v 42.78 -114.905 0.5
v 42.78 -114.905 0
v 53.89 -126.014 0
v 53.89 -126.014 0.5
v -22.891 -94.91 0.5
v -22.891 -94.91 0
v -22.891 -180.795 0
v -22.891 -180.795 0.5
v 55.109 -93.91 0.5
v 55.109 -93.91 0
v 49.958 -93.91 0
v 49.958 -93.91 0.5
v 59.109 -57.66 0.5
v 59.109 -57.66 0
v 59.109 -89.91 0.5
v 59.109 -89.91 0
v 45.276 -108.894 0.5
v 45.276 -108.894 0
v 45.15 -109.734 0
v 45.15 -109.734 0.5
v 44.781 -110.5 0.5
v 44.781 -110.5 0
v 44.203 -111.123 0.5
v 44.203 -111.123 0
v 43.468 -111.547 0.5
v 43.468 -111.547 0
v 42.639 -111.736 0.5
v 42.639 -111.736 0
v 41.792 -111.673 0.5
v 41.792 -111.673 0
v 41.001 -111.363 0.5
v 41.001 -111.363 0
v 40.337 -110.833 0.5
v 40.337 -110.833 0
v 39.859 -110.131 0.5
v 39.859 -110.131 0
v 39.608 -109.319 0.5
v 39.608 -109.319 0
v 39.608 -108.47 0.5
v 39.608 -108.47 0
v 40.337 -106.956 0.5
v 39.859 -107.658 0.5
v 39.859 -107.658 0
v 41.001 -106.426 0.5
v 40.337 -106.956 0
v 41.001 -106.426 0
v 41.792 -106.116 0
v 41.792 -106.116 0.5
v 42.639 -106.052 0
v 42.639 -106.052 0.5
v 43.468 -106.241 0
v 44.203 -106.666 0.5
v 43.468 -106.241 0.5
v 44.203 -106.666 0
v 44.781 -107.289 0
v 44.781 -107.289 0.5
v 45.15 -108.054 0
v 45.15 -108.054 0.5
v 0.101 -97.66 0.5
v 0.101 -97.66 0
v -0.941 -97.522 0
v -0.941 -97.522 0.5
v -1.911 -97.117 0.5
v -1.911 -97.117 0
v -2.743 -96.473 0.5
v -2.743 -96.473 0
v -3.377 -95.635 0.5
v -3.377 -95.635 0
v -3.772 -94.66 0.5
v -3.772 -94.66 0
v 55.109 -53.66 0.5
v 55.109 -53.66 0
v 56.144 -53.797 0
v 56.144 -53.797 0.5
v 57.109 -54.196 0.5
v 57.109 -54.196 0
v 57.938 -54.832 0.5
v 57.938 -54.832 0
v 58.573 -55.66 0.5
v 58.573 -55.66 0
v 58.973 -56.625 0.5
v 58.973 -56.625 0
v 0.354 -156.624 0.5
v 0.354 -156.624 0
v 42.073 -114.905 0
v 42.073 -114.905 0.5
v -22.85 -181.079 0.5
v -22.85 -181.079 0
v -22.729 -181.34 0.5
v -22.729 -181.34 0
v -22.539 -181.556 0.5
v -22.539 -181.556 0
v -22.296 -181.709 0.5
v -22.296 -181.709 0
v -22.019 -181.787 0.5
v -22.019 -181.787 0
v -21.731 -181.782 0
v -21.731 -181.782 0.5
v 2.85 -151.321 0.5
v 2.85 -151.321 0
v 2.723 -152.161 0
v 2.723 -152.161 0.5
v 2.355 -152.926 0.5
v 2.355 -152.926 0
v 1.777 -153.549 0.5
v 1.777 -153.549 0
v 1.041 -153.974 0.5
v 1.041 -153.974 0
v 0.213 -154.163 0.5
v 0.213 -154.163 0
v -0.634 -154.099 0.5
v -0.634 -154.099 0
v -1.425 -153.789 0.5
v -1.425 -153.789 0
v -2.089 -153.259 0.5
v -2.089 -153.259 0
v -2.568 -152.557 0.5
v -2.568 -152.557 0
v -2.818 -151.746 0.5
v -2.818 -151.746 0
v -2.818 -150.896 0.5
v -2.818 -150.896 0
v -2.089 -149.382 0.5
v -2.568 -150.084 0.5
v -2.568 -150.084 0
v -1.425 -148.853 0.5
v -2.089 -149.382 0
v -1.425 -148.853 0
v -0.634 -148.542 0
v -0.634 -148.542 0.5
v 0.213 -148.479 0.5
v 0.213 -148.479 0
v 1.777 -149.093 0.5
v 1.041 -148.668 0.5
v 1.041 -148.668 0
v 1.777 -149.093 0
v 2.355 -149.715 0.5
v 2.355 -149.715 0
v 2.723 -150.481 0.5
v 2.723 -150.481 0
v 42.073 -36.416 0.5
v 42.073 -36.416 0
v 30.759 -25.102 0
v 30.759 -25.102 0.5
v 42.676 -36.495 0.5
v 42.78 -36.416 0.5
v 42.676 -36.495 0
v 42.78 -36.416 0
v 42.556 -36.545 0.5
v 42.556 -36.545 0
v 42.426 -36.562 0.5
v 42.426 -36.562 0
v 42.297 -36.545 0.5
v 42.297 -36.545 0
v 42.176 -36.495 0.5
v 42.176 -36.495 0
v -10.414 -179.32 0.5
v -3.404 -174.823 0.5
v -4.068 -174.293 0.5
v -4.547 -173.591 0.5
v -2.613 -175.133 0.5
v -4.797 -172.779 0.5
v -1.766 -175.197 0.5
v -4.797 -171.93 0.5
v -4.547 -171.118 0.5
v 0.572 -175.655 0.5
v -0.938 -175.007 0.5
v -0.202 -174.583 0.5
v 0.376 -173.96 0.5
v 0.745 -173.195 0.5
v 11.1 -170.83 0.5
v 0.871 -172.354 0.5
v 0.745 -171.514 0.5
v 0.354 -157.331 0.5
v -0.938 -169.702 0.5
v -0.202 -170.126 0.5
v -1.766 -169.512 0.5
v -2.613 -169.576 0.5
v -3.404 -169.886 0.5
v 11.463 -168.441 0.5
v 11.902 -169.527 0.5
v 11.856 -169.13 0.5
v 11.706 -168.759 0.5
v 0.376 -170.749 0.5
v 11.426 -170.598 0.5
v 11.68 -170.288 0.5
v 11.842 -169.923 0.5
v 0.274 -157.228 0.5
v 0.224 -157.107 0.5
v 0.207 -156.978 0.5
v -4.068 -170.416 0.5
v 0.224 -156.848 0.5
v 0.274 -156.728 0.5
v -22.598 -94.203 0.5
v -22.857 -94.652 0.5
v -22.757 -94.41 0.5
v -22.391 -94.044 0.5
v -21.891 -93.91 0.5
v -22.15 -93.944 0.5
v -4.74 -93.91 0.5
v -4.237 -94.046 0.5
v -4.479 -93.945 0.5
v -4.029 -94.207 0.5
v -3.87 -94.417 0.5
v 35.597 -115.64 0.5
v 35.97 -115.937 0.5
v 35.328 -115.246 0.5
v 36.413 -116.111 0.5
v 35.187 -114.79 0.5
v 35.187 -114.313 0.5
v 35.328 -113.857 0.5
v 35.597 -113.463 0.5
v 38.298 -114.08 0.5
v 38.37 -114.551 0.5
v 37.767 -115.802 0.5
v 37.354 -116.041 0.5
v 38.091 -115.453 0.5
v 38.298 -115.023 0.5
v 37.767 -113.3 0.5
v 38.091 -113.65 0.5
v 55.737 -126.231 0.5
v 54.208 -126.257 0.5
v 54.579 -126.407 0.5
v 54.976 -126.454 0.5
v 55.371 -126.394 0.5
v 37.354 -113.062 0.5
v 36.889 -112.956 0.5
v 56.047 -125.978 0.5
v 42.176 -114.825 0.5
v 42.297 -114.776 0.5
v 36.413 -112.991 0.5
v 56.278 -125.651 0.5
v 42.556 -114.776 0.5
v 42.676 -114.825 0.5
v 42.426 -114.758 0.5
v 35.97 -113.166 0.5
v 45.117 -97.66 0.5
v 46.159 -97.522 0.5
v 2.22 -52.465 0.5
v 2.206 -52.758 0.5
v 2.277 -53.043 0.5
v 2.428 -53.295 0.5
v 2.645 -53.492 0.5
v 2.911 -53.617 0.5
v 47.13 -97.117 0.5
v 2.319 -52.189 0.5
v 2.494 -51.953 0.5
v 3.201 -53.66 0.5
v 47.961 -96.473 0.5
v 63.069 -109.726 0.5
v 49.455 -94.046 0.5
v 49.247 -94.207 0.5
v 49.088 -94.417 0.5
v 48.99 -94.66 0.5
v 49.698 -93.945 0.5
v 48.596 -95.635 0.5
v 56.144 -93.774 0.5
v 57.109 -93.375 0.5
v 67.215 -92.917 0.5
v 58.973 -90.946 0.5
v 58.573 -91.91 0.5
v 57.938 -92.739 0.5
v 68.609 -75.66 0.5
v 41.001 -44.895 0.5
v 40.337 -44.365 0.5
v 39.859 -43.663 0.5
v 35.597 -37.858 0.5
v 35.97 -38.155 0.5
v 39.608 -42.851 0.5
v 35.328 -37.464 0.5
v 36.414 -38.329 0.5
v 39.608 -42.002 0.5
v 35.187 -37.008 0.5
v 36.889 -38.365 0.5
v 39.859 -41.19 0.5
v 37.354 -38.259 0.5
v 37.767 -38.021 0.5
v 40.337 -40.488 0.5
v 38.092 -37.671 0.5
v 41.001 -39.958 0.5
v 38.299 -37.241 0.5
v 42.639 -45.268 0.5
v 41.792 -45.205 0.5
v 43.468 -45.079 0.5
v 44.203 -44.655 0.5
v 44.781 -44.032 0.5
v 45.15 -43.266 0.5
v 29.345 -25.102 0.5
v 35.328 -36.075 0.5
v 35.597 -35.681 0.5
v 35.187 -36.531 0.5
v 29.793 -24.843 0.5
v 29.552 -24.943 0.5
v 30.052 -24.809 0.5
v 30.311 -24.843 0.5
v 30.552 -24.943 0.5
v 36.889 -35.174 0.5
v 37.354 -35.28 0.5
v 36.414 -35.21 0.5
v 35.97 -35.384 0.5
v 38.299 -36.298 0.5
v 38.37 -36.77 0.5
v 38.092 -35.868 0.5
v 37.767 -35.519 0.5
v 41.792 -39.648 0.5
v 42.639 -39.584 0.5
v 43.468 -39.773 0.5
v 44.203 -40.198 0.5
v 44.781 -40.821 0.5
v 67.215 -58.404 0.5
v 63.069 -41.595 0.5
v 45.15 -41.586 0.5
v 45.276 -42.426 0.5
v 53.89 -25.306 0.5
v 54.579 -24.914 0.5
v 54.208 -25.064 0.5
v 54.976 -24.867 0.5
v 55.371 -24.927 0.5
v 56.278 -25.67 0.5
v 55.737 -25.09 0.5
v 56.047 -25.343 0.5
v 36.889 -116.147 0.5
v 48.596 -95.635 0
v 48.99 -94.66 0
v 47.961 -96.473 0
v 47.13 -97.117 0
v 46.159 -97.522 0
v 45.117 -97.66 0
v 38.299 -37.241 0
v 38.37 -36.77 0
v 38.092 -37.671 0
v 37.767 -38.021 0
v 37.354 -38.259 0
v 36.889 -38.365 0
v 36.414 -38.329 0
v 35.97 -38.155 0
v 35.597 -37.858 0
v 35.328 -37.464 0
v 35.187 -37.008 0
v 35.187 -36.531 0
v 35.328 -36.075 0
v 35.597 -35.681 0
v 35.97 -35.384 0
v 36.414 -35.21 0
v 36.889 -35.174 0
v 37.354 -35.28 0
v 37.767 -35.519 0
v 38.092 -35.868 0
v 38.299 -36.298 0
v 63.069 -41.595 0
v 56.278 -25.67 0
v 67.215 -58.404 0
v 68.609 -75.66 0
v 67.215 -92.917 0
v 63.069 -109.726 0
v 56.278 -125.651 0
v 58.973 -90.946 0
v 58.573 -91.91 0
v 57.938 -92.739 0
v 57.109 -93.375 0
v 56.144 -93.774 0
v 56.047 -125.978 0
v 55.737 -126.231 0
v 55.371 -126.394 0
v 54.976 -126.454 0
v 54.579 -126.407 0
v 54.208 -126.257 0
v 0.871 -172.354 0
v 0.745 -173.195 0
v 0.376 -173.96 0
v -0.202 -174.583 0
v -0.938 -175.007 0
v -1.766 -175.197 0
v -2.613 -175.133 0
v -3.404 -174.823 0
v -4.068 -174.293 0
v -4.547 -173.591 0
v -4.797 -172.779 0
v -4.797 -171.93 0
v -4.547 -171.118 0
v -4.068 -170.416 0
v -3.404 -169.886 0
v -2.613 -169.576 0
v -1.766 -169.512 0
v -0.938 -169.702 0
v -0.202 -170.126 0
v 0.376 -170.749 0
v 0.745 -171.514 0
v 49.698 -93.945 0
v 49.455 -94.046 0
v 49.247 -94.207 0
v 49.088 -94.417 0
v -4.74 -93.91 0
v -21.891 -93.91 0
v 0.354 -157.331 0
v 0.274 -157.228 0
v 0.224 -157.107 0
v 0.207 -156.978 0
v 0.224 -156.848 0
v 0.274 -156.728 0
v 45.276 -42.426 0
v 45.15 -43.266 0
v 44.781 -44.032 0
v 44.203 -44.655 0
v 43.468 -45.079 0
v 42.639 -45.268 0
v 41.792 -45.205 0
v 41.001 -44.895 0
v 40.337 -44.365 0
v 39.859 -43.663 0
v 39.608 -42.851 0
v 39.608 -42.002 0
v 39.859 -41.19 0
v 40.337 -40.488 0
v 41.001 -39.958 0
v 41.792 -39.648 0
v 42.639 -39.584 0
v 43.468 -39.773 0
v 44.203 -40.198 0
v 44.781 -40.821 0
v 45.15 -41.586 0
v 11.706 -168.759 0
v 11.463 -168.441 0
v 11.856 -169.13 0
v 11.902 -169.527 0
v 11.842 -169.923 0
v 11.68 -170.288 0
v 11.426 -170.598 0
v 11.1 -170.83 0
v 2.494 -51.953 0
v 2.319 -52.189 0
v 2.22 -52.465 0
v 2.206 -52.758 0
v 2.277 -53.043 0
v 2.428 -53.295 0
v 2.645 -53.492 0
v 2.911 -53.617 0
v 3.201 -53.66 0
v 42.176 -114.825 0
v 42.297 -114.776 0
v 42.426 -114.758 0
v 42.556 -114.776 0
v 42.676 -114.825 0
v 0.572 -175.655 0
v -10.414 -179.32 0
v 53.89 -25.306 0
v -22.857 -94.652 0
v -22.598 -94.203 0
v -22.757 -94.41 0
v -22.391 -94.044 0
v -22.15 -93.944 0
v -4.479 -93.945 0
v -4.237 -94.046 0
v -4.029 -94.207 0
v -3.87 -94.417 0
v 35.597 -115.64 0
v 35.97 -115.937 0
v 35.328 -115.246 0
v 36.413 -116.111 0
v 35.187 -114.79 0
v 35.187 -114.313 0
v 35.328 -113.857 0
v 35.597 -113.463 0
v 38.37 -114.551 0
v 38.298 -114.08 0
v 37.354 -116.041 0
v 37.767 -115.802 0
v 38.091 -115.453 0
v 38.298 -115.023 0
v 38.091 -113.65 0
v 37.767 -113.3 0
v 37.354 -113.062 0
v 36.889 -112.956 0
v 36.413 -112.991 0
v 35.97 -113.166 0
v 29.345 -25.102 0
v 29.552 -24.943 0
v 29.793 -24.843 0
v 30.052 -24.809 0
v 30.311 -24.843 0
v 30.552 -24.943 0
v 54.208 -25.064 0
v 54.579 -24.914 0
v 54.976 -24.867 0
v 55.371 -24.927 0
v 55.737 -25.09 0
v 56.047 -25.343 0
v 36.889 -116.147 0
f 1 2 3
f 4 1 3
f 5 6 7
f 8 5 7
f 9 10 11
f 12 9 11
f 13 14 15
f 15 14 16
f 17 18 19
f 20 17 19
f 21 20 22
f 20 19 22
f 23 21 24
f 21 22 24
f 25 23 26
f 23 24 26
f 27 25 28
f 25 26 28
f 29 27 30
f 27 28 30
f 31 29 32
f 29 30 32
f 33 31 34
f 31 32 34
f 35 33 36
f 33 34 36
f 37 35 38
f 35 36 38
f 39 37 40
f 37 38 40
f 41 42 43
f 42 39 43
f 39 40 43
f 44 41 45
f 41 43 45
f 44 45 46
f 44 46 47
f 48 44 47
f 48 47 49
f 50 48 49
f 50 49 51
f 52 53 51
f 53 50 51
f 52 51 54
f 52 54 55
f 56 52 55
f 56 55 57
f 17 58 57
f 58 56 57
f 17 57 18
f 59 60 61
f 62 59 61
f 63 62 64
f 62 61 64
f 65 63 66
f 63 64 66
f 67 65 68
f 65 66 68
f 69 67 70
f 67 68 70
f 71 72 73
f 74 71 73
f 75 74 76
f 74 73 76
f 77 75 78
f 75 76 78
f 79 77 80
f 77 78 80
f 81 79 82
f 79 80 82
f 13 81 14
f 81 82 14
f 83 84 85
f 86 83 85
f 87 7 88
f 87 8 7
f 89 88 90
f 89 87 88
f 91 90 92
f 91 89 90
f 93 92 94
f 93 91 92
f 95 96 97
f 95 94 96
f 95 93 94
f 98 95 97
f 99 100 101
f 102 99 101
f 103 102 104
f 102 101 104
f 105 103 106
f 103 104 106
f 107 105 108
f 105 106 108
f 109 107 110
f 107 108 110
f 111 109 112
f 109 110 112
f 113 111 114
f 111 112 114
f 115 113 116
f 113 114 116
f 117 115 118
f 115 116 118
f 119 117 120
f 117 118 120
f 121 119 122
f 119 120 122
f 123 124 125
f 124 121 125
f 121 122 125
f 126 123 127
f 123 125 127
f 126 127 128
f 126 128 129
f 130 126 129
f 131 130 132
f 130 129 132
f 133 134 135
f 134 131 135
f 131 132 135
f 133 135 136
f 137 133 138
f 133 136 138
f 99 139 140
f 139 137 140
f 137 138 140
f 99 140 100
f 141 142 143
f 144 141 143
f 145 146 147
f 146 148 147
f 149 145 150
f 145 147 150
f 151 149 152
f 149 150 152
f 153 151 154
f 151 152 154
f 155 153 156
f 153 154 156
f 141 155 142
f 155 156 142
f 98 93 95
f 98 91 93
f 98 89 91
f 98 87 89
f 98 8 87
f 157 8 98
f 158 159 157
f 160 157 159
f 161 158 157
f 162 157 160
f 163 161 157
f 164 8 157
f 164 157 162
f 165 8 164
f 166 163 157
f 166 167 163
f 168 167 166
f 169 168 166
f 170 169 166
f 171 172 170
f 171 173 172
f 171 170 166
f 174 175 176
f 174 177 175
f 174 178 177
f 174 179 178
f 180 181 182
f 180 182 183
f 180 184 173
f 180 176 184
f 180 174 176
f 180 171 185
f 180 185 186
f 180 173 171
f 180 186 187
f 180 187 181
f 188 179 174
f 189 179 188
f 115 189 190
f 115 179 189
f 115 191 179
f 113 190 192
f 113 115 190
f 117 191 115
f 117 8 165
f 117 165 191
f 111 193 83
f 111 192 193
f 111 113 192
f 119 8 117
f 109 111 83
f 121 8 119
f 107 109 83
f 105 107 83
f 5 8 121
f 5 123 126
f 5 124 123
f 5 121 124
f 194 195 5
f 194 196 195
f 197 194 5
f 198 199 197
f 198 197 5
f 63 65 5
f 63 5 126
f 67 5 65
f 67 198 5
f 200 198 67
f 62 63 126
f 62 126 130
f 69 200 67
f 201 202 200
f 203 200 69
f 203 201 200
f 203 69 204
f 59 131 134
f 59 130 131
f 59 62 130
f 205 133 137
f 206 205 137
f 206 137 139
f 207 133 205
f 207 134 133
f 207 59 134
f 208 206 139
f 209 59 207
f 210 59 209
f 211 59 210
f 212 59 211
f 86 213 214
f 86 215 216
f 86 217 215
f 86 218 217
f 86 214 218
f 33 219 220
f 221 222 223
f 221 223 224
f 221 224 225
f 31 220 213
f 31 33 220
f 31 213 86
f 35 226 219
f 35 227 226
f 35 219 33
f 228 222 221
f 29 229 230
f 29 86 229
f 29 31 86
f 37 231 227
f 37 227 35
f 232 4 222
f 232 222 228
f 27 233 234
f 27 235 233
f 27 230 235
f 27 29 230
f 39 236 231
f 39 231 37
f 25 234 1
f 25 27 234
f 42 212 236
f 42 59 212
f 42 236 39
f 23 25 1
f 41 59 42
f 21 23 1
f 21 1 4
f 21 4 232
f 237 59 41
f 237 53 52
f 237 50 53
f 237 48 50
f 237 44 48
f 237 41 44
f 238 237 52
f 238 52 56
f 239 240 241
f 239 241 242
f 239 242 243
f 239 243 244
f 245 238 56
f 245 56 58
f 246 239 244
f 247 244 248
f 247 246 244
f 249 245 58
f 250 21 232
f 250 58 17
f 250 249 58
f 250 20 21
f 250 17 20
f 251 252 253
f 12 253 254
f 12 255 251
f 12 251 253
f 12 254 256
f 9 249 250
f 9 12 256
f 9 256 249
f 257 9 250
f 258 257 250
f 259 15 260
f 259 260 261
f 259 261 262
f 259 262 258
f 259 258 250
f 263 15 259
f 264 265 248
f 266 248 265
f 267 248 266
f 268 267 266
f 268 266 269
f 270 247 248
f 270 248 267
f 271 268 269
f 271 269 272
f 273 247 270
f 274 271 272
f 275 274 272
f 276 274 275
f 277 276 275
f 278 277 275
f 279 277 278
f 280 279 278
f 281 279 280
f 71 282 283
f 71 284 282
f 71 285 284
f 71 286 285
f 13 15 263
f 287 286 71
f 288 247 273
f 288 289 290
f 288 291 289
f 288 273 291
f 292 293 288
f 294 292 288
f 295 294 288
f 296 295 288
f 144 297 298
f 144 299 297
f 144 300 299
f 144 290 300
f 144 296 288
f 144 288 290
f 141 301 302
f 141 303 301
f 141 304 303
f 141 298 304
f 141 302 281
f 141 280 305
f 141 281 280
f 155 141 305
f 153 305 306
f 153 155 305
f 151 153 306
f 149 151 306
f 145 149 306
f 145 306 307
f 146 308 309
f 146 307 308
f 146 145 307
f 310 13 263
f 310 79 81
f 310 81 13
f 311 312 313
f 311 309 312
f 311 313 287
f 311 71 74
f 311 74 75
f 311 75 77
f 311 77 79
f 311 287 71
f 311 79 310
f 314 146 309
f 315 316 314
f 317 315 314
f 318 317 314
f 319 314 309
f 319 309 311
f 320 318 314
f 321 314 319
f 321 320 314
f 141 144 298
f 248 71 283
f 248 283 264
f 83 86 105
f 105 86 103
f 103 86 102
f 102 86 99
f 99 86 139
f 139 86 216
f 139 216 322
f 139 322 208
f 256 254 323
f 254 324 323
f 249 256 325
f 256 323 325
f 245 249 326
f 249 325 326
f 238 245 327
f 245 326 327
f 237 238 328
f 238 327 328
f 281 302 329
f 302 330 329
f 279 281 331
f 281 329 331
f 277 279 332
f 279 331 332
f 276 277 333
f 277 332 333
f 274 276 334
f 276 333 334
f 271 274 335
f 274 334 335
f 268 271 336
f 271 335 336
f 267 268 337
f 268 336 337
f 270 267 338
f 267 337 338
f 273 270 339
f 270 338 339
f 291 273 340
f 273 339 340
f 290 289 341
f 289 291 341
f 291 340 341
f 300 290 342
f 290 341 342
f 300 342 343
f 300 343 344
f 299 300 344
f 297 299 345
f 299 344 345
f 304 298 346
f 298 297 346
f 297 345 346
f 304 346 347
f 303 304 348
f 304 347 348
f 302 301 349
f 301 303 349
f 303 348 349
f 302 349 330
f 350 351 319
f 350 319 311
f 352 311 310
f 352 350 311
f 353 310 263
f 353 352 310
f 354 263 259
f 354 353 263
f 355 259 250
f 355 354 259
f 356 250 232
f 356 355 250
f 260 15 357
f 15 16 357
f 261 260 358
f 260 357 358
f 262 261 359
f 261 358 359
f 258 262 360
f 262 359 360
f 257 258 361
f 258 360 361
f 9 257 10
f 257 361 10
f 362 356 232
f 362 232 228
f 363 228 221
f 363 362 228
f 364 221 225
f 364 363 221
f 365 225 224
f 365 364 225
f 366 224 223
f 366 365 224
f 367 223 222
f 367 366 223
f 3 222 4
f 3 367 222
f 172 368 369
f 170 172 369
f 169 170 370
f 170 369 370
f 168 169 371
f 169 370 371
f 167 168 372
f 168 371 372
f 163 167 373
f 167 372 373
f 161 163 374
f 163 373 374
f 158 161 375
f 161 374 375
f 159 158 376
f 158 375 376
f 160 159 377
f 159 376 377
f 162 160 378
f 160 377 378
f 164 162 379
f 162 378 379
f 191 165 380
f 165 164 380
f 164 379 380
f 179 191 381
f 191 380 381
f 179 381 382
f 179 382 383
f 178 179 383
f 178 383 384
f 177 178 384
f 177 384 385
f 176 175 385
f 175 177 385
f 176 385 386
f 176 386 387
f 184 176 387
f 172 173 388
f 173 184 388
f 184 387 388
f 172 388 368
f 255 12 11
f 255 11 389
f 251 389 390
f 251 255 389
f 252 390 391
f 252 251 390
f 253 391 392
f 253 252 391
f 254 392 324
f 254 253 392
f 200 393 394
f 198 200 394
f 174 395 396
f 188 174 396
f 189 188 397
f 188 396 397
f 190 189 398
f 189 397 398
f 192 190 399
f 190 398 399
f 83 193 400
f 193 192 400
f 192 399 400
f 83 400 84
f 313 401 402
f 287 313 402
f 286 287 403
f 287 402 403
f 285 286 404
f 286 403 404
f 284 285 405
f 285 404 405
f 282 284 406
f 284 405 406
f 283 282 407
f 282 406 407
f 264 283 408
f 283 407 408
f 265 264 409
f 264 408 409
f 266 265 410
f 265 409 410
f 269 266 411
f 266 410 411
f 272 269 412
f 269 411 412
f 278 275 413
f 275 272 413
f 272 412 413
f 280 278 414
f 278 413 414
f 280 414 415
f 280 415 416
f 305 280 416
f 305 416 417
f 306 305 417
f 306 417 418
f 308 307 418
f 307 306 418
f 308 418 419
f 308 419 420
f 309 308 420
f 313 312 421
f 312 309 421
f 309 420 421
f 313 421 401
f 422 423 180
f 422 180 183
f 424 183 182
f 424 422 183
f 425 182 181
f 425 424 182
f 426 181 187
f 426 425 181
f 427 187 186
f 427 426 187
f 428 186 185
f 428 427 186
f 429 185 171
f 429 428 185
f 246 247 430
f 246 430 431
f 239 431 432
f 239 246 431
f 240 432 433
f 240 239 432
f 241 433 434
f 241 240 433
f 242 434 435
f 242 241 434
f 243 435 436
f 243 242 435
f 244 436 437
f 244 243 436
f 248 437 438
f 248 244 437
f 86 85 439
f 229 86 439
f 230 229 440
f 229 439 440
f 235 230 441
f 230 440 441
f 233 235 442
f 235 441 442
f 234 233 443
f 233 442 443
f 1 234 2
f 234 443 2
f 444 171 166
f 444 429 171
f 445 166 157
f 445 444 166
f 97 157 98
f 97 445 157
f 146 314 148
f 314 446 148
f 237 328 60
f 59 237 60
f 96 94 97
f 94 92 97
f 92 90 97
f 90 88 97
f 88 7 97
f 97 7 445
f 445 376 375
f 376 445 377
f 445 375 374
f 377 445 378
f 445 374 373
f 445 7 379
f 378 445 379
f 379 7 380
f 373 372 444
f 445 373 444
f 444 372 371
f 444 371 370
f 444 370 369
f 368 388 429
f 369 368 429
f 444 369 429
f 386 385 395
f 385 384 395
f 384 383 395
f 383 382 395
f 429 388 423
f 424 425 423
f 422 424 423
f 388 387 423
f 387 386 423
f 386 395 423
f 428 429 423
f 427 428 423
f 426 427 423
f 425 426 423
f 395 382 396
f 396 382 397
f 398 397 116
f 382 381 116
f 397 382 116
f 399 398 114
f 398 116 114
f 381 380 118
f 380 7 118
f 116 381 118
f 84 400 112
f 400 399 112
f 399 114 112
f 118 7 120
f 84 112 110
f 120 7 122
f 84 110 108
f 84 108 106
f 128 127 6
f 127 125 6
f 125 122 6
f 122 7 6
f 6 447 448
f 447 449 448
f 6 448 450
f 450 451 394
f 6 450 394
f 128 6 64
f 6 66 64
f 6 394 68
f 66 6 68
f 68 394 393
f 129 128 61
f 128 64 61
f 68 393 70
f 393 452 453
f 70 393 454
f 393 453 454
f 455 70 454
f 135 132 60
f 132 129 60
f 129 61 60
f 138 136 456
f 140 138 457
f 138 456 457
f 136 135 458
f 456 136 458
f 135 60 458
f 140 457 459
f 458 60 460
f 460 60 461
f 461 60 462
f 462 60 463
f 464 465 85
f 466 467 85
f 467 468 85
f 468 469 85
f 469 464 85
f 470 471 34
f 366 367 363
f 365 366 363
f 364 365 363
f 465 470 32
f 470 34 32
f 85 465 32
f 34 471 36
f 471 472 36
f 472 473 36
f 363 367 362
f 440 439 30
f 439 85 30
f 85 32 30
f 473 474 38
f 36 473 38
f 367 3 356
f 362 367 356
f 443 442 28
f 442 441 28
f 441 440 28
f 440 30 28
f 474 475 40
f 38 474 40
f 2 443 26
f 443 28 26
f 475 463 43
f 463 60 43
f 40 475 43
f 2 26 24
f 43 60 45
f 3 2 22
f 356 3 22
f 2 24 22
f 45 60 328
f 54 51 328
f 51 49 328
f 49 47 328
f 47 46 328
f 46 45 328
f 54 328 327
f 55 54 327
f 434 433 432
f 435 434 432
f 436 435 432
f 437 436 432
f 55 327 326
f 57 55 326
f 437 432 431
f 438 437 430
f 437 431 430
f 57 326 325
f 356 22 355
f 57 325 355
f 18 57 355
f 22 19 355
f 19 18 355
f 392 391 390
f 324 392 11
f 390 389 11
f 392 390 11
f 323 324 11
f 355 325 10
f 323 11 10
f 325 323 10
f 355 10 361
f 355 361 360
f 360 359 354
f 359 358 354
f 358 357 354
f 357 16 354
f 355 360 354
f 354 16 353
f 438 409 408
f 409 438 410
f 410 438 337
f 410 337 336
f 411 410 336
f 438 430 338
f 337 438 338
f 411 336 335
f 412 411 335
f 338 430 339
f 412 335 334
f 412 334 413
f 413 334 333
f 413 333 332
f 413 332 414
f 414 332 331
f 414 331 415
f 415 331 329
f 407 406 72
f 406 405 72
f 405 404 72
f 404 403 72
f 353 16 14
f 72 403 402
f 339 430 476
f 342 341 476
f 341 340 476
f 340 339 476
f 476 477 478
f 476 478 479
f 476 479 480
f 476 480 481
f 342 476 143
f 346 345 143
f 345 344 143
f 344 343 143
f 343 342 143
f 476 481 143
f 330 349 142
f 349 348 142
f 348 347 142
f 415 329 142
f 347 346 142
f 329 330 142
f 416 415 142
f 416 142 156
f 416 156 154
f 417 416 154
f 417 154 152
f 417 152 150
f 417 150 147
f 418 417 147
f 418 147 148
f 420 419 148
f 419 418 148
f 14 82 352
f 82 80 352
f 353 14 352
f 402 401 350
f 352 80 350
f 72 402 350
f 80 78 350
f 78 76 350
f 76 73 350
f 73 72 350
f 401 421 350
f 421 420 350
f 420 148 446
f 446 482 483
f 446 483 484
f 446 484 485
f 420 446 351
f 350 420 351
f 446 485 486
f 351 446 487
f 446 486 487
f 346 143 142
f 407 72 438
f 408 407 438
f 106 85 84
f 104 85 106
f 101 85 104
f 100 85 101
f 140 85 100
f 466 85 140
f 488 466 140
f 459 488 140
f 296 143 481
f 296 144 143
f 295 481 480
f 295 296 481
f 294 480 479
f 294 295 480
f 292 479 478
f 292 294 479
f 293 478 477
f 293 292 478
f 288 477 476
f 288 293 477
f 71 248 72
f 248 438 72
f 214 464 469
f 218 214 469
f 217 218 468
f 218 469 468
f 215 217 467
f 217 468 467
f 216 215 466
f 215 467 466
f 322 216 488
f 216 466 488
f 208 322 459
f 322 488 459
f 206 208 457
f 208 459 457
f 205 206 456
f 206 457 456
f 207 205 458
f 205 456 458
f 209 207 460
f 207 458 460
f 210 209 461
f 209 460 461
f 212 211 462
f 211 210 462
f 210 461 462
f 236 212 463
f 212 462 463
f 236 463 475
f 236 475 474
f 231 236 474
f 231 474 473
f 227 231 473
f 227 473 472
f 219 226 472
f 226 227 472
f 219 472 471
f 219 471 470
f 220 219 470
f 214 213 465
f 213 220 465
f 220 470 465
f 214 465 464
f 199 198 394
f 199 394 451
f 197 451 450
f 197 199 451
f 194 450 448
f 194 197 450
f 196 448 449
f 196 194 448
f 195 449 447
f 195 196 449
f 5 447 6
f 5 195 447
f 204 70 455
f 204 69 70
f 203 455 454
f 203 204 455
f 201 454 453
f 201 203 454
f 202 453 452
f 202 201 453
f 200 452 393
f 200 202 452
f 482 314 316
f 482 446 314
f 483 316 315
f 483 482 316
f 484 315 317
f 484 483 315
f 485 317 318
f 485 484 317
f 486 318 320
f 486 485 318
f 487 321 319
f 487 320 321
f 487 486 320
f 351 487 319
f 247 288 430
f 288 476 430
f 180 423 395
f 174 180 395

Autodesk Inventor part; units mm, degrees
ref_plane "YZ Plane" through (0, 0, 0) normal (1, 0, 0) x (0, 1, 0)
ref_plane "XZ Plane" through (0, 0, 0) normal (0, 1, 0) x (-1, 0, 0)
ref_plane "Work Plane1" through (0, 0, 0) normal (0, 0, 1) x (1, 0, 0)
sketch "Sketch1" plane through (0, 0, 0) normal (0, 0, 1) x (1, 0, 0)
  circle A0 centre (-1.9788, -172.3545) radius 2.85 projected
  circle A1 centre (36.7695, -114.5513) radius 1.6 projected
  circle A2 centre (-114.5513, -114.5513) radius 1.6 projected
  circle A3 centre (-114.5513, -36.7695) radius 1.6 projected
  circle A4 centre (36.7696, -36.7696) radius 1.6 projected
  circle A5 centre (-120.2082, -108.8944) radius 2.85 projected
  circle A6 centre (-120.2082, -42.4264) radius 2.85 projected
  circle A7 centre (42.4264, -42.4264) radius 2.85 projected
  circle A8 centre (42.4264, -108.8944) radius 2.85 projected
  circle A9 centre (0, -151.3209) radius 2.85 projected
  circle A10 centre (-77.7818, -151.3208) radius 2.85 projected
  arc A11 (3.1213, -2.5355) -> (3.3245, -2.9609) centre (3.2981, -2.7123) ccw projected
  arc A12 (4.9497, -3.5355) -> (3.3245, -2.9609) centre (3.5355, -4.9497) ccw projected
  line L0 (4.9497, -3.5355) -> (33.234, -31.8198) projected
  arc A13 (33.234, -34.6482) -> (33.234, -31.8198) centre (31.8198, -33.234) ccw projected
  line L1 (33.234, -34.6482) -> (32.5269, -35.3553) projected
  arc A14 (32.5269, -35.3553) -> (32.5269, -38.1838) centre (33.9411, -36.7696) ccw projected
  line L2 (32.5269, -38.1838) -> (41.0122, -46.669) projected
  arc A15 (41.0122, -46.669) -> (43.8406, -46.669) centre (42.4264, -45.2548) ccw projected
  line L3 (43.8406, -46.669) -> (50.8531, -39.6566) projected
  arc A16 (54.1372, -40.3613) -> (50.8531, -39.6566) centre (52.2673, -41.0708) ccw projected
  arc A17 (54.1372, -110.9596) -> (54.1372, -40.3613) centre (-38.8909, -75.6604) ccw projected
  arc A18 (50.8531, -111.6643) -> (54.1372, -110.9596) centre (52.2673, -110.25) ccw projected
  line L4 (50.8531, -111.6643) -> (43.8406, -104.6518) projected
  arc A19 (43.8406, -104.6518) -> (41.0122, -104.6518) centre (42.4264, -106.066) ccw projected
  line L5 (41.0122, -104.6518) -> (32.5269, -113.1371) projected
  arc A20 (32.5269, -113.1371) -> (32.5269, -115.9655) centre (33.9411, -114.5513) ccw projected
  line L6 (32.5269, -115.9655) -> (33.234, -116.6726) projected
  arc A21 (33.234, -119.501) -> (33.234, -116.6726) centre (31.8198, -118.0868) ccw projected
  line L7 (33.234, -119.501) -> (4.9497, -147.7853) projected
  arc A22 (2.1213, -147.7853) -> (4.9497, -147.7853) centre (3.5355, -146.3711) ccw projected
  line L8 (2.1213, -147.7853) -> (1.4142, -147.0782) projected
  arc A23 (1.4142, -147.0782) -> (-1.4142, -147.0782) centre (0, -148.4924) ccw projected
  line L9 (-1.4142, -147.0782) -> (-9.8995, -155.5635) projected
  arc A24 (-9.8995, -155.5635) -> (-9.8995, -158.3919) centre (-8.4853, -156.9777) ccw projected
  line L10 (-9.8995, -158.3919) -> (-2.8871, -165.4044) projected
  arc A25 (-3.5917, -168.6885) -> (-2.8871, -165.4044) centre (-4.3013, -166.8186) ccw projected
  arc A26 (-21.3624, -173.6043) -> (-3.5917, -168.6885) centre (-38.8909, -75.6604) ccw projected
  arc A27 (-24.8909, -170.6512) -> (-21.3624, -173.6043) centre (-21.8909, -170.6512) ccw projected
  line L11 (-24.8909, -107.6604) -> (-24.8909, -170.6512) projected
  arc A28 (-24.8909, -107.6604) -> (-27.8909, -104.6604) centre (-27.8909, -107.6604) ccw projected
  line L12 (-49.8909, -104.6604) -> (-27.8909, -104.6604) projected
  arc A29 (-49.8909, -104.6604) -> (-52.8909, -107.6604) centre (-49.8909, -107.6604) ccw projected
  line L13 (-52.8909, -170.6512) -> (-52.8909, -107.6604) projected
  arc A30 (-56.4194, -173.6043) -> (-52.8909, -170.6512) centre (-55.8909, -170.6512) ccw projected
  arc A31 (-74.19, -168.6885) -> (-56.4194, -173.6043) centre (-38.8909, -75.6604) ccw projected
  arc A32 (-74.8947, -165.4044) -> (-74.19, -168.6885) centre (-73.4805, -166.8186) ccw projected
  line L14 (-74.8947, -165.4044) -> (-67.8823, -158.3919) projected
  arc A33 (-67.8823, -158.3919) -> (-67.8823, -155.5635) centre (-69.2965, -156.9777) ccw projected
  line L15 (-67.8823, -155.5635) -> (-76.3675, -147.0782) projected
  arc A34 (-76.3675, -147.0782) -> (-79.196, -147.0782) centre (-77.7817, -148.4924) ccw projected
  line L16 (-79.196, -147.0782) -> (-79.9031, -147.7853) projected
  arc A35 (-82.7315, -147.7853) -> (-79.9031, -147.7853) centre (-81.3173, -146.3711) ccw projected
  line L17 (-82.7315, -147.7853) -> (-111.0158, -119.501) projected
  arc A36 (-111.0158, -116.6726) -> (-111.0158, -119.501) centre (-109.6016, -118.0868) ccw projected
  line L18 (-111.0158, -116.6726) -> (-110.3087, -115.9655) projected
  arc A37 (-110.3087, -115.9655) -> (-110.3087, -113.1371) centre (-111.7229, -114.5513) ccw projected
  line L19 (-110.3087, -113.1371) -> (-118.794, -104.6518) projected
  arc A38 (-118.794, -104.6518) -> (-121.6224, -104.6518) centre (-120.2082, -106.066) ccw projected
  line L20 (-121.6224, -104.6518) -> (-128.6348, -111.6642) projected
  arc A39 (-131.9189, -110.9596) -> (-128.6348, -111.6642) centre (-130.049, -110.25) ccw projected
  arc A40 (-138.0344, -84.0758) -> (-131.9189, -110.9596) centre (-38.8909, -75.6604) ccw projected
  arc A41 (-138.0344, -84.0758) -> (-139.0308, -83.1604) centre (-139.0308, -84.1604) ccw projected
  line L21 (-139.0308, -83.1604) -> (-143.8909, -83.1604) projected
  arc A42 (-144.8909, -82.1604) -> (-143.8909, -83.1604) centre (-143.8909, -82.1604) ccw projected
  line L22 (-144.8909, -82.1604) -> (-144.8909, -69.1604) projected
  arc A43 (-143.8909, -68.1604) -> (-144.8909, -69.1604) centre (-143.8909, -69.1604) ccw projected
  line L23 (-143.8909, -68.1604) -> (-139.0308, -68.1604) projected
  arc A44 (-139.0308, -68.1604) -> (-138.0344, -67.245) centre (-139.0308, -67.1604) ccw projected
  arc A45 (-131.9189, -40.3613) -> (-138.0344, -67.245) centre (-38.8909, -75.6604) ccw projected
  arc A46 (-128.6348, -39.6566) -> (-131.9189, -40.3613) centre (-130.049, -41.0708) ccw projected
  line L24 (-128.6348, -39.6566) -> (-121.6224, -46.669) projected
  arc A47 (-121.6224, -46.669) -> (-118.7939, -46.669) centre (-120.2082, -45.2548) ccw projected
  line L25 (-118.7939, -46.669) -> (-110.3087, -38.1838) projected
  arc A48 (-110.3087, -38.1838) -> (-110.3087, -35.3553) centre (-111.7229, -36.7696) ccw projected
  line L26 (-110.3087, -35.3553) -> (-111.0158, -34.6482) projected
  arc A49 (-111.0158, -31.8198) -> (-111.0158, -34.6482) centre (-109.6016, -33.234) ccw projected
  line L27 (-111.0158, -31.8198) -> (-82.7315, -3.5355) projected
  arc A50 (-81.1062, -2.9609) -> (-82.7315, -3.5355) centre (-81.3173, -4.9497) ccw projected
  arc A51 (-81.1062, -2.9609) -> (-80.9031, -2.5355) centre (-81.0798, -2.7123) ccw projected
  line L28 (-80.9031, -2.5355) -> (-83.4386, 0) projected
  line L29 (-83.4386, 0) -> (-119.8546, -36.416) projected
  arc A52 (-120.5617, -36.416) -> (-119.8546, -36.416) centre (-120.2082, -36.0624) ccw projected
  line L30 (-120.5617, -36.416) -> (-131.6714, -25.3063) projected
  arc A53 (-131.6714, -25.3063) -> (-134.06, -25.6695) centre (-132.732, -26.367) ccw projected
  arc A54 (-134.06, -25.6695) -> (-134.06, -125.6514) centre (-38.8909, -75.6604) ccw projected
  arc A55 (-134.06, -125.6514) -> (-131.6714, -126.0145) centre (-132.732, -124.9538) ccw projected
  line L31 (-131.6714, -126.0145) -> (-120.5617, -114.9048) projected
  arc A56 (-119.8546, -114.9048) -> (-120.5617, -114.9048) centre (-120.2082, -115.2584) ccw projected
  line L32 (-119.8546, -114.9048) -> (-78.1353, -156.6241) projected
  arc A57 (-78.1353, -157.3312) -> (-78.1353, -156.6241) centre (-78.4889, -156.9777) ccw projected
  line L33 (-78.1353, -157.3312) -> (-89.245, -168.4409) projected
  arc A58 (-89.245, -168.4409) -> (-88.8818, -170.8295) centre (-88.1843, -169.5016) ccw projected
  arc A59 (-88.8818, -170.8295) -> (-52.1373, -182.3412) centre (-38.8909, -75.6604) ccw projected
  arc A60 (-52.1373, -182.3412) -> (-49.8909, -180.3564) centre (-51.8909, -180.3564) ccw projected
  line L34 (-49.8909, -108.6604) -> (-49.8909, -180.3564) projected
  arc A61 (-48.8909, -107.6604) -> (-49.8909, -108.6604) centre (-48.8909, -108.6604) ccw projected
  line L35 (-28.8909, -107.6604) -> (-48.8909, -107.6604) projected
  arc A62 (-27.8909, -108.6604) -> (-28.8909, -107.6604) centre (-28.8909, -108.6604) ccw projected
  line L36 (-27.8909, -108.6604) -> (-27.8909, -180.3564) projected
  arc A63 (-27.8909, -180.3564) -> (-25.6444, -182.3412) centre (-25.8909, -180.3564) ccw projected
  arc A64 (-25.6444, -182.3412) -> (11.1001, -170.8295) centre (-38.8909, -75.6604) ccw projected
  arc A65 (11.1001, -170.8295) -> (11.4632, -168.4409) centre (10.4025, -169.5016) ccw projected
  line L37 (11.4632, -168.4409) -> (0.3535, -157.3313) projected
  arc A66 (0.3535, -156.6242) -> (0.3535, -157.3313) centre (0.7071, -156.9777) ccw projected
  line L38 (0.3535, -156.6242) -> (42.0728, -114.9049) projected
  arc A67 (42.7799, -114.9049) -> (42.0728, -114.9049) centre (42.4264, -115.2584) ccw projected
  line L39 (42.7799, -114.9049) -> (53.8896, -126.0145) projected
  arc A68 (53.8896, -126.0145) -> (56.2782, -125.6514) centre (54.9503, -124.9538) ccw projected
  arc A69 (56.2782, -125.6514) -> (56.2782, -25.6695) centre (-38.8909, -75.6604) ccw projected
  arc A70 (56.2782, -25.6695) -> (53.8896, -25.3064) centre (54.9503, -26.367) ccw projected
  line L40 (53.8896, -25.3064) -> (42.78, -36.416) projected
  arc A71 (42.0729, -36.416) -> (42.78, -36.416) centre (42.4264, -36.0624) ccw projected
  line L41 (42.0729, -36.416) -> (5.6568, 0) projected
  line L42 (5.6568, 0) -> (3.1213, -2.5355) projected
  arc A72 (-22.8909, -107.6604) -> (-27.8909, -102.6604) centre (-27.8909, -107.6604) ccw
  line L43 (-22.8909, -107.6604) -> (-22.8909, -170.6512)
  arc A73 (-22.8909, -170.6512) -> (-21.7147, -171.6356) centre (-21.8909, -170.6512) ccw
  arc A74 (-21.7147, -171.6356) -> (-4.3013, -166.8186) centre (-38.8909, -75.6604) ccw
  line L44 (-4.3013, -166.8186) -> (-11.3137, -159.8061)
  arc A75 (-11.3137, -154.1493) -> (-11.3137, -159.8061) centre (-8.4853, -156.9777) ccw
  line L45 (-11.3137, -154.1493) -> (-2.8284, -145.664)
  arc A76 (2.8284, -145.664) -> (-2.8284, -145.664) centre (0, -148.4924) ccw
  line L46 (2.8284, -145.664) -> (3.5355, -146.3711)
  line L47 (3.5355, -146.3711) -> (31.8198, -118.0868)
  line L48 (31.8198, -118.0868) -> (31.1127, -117.3797)
  arc A77 (31.1127, -111.7229) -> (31.1127, -117.3797) centre (33.9411, -114.5513) ccw
  line L49 (31.1127, -111.7229) -> (39.598, -103.2376)
  arc A78 (45.2548, -103.2376) -> (39.598, -103.2376) centre (42.4264, -106.066) ccw
  line L50 (45.2548, -103.2376) -> (52.2673, -110.25)
  arc A79 (52.2673, -110.25) -> (52.2673, -41.0708) centre (-38.8909, -75.6604) ccw
  line L51 (52.2673, -41.0708) -> (45.2548, -48.0833)
  arc A80 (39.598, -48.0833) -> (45.2548, -48.0833) centre (42.4264, -45.2548) ccw
  line L52 (39.598, -48.0833) -> (31.1127, -39.598)
  arc A81 (31.1127, -33.9411) -> (31.1127, -39.598) centre (33.9411, -36.7696) ccw
  line L53 (31.1127, -33.9411) -> (31.8198, -33.234)
  line L54 (31.8198, -33.234) -> (3.5355, -4.9497)
  arc A82 (1.7071, -1.1213) -> (3.5355, -4.9497) centre (3.2981, -2.7123) ccw
  line L55 (1.7071, -1.1213) -> (5.6568, 2.8284)
  line L56 (5.6568, 2.8284) -> (42.4264, -33.9411)
  line L57 (42.4264, -33.9411) -> (52.4754, -23.8921)
  arc A83 (58.0488, -24.7394) -> (52.4754, -23.8921) centre (54.9503, -26.367) ccw
  arc A84 (58.0488, -126.5815) -> (58.0488, -24.7394) centre (-38.8909, -75.6604) ccw
  arc A85 (52.4754, -127.4287) -> (58.0488, -126.5815) centre (54.9503, -124.9538) ccw
  line L58 (52.4754, -127.4287) -> (42.4264, -117.3797)
  line L59 (42.4264, -117.3797) -> (2.8284, -156.9777)
  line L60 (2.8284, -156.9777) -> (12.8774, -167.0267)
  arc A86 (12.0301, -172.6001) -> (12.8774, -167.0267) centre (10.4025, -169.5016) ccw
  arc A87 (-25.398, -184.3259) -> (12.0301, -172.6001) centre (-38.8909, -75.6604) ccw
  arc A88 (-29.8909, -180.3564) -> (-25.398, -184.3259) centre (-25.8909, -180.3564) ccw
  line L61 (-29.8909, -180.3564) -> (-29.8909, -109.6604)
  line L62 (-29.8909, -109.6604) -> (-47.8909, -109.6604)
  line L63 (-47.8909, -109.6604) -> (-47.8909, -180.3564)
  arc A89 (-52.3838, -184.3259) -> (-47.8909, -180.3564) centre (-51.8909, -180.3564) ccw
  arc A90 (-89.8119, -172.6001) -> (-52.3838, -184.3259) centre (-38.8909, -75.6604) ccw
  arc A91 (-90.6592, -167.0267) -> (-89.8119, -172.6001) centre (-88.1843, -169.5016) ccw
  line L64 (-90.6592, -167.0267) -> (-80.6102, -156.9777)
  line L65 (-80.6102, -156.9777) -> (-120.2082, -117.3797)
  line L66 (-120.2082, -117.3797) -> (-130.2571, -127.4287)
  arc A92 (-135.8306, -126.5814) -> (-130.2571, -127.4287) centre (-132.732, -124.9538) ccw
  arc A93 (-135.8305, -24.7394) -> (-135.8306, -126.5814) centre (-38.8909, -75.6604) ccw
  arc A94 (-130.2571, -23.8921) -> (-135.8305, -24.7394) centre (-132.732, -26.367) ccw
  line L67 (-130.2571, -23.8921) -> (-120.2082, -33.9411)
  line L68 (-120.2082, -33.9411) -> (-83.4386, 2.8284)
  line L69 (-83.4386, 2.8284) -> (-79.4889, -1.1213)
  arc A95 (-81.3173, -4.9497) -> (-79.4889, -1.1213) centre (-81.0798, -2.7123) ccw
  line L70 (-81.3173, -4.9497) -> (-109.6016, -33.234)
  line L71 (-109.6016, -33.234) -> (-108.8945, -33.9411)
  arc A96 (-108.8945, -39.598) -> (-108.8945, -33.9411) centre (-111.7229, -36.7696) ccw
  line L72 (-108.8945, -39.598) -> (-117.3797, -48.0832)
  arc A97 (-123.0366, -48.0832) -> (-117.3797, -48.0832) centre (-120.2082, -45.2548) ccw
  line L73 (-123.0366, -48.0832) -> (-130.049, -41.0708)
  arc A98 (-130.049, -41.0708) -> (-136.0415, -67.4141) centre (-38.8909, -75.6604) ccw
  arc A99 (-139.0308, -70.1604) -> (-136.0415, -67.4141) centre (-139.0308, -67.1604) ccw
  line L74 (-139.0308, -70.1604) -> (-142.8909, -70.1604)
  line L75 (-142.8909, -70.1604) -> (-142.8909, -81.1604)
  line L76 (-142.8909, -81.1604) -> (-139.0308, -81.1604)
  arc A100 (-136.0415, -83.9067) -> (-139.0308, -81.1604) centre (-139.0308, -84.1604) ccw
  arc A101 (-136.0415, -83.9067) -> (-130.049, -110.25) centre (-38.8909, -75.6604) ccw
  line L77 (-130.049, -110.25) -> (-123.0366, -103.2376)
  arc A102 (-117.3797, -103.2376) -> (-123.0366, -103.2376) centre (-120.2082, -106.066) ccw
  line L78 (-117.3797, -103.2376) -> (-108.8945, -111.7229)
  arc A103 (-108.8945, -117.3797) -> (-108.8945, -111.7229) centre (-111.7229, -114.5513) ccw
  line L79 (-108.8945, -117.3797) -> (-109.6016, -118.0868)
  line L80 (-109.6016, -118.0868) -> (-81.3173, -146.3711)
  line L81 (-81.3173, -146.3711) -> (-80.6102, -145.664)
  arc A104 (-74.9533, -145.664) -> (-80.6102, -145.664) centre (-77.7817, -148.4924) ccw
  line L82 (-74.9533, -145.664) -> (-66.4681, -154.1493)
  arc A105 (-66.4681, -159.8061) -> (-66.4681, -154.1493) centre (-69.2965, -156.9777) ccw
  line L83 (-66.4681, -159.8061) -> (-73.4805, -166.8186)
  arc A106 (-73.4805, -166.8186) -> (-56.067, -171.6356) centre (-38.8909, -75.6604) ccw
  arc A107 (-56.067, -171.6356) -> (-54.8909, -170.6512) centre (-55.8909, -170.6512) ccw
  line L84 (-54.8909, -170.6512) -> (-54.8909, -107.6604)
  arc A108 (-49.8909, -102.6604) -> (-54.8909, -107.6604) centre (-49.8909, -107.6604) ccw
  line L85 (-49.8909, -102.6604) -> (-27.8909, -102.6604)
  line L86 (26.5165, -25.1023) -> (18.0312, -33.5876)
  line L87 (30.052, -24.3952) -> (19.4454, -35.0018)
  line L88 (19.4454, -35.0018) -> (-48.2132, -102.6604)
  line L89 (-22.8909, -107.6604) -> (-22.8909, -93.6016)
  line L90 (-22.8909, -93.6016) -> (-22.8909, -183.9852)
  circle A109 centre (-38.8909, -63.6604) radius 1.35 projected
  circle A110 centre (-38.8909, -87.6604) radius 1.35 projected
  arc A111 (-134.1409, -64.6604) -> (-136.1409, -66.6604) centre (-134.1409, -66.6604) ccw projected
  line L91 (-136.1409, -84.6604) -> (-136.1409, -66.6604) projected
  arc A112 (-136.1409, -84.6604) -> (-134.1409, -86.6604) centre (-134.1409, -84.6604) ccw projected
  line L92 (-113.1409, -86.6604) -> (-134.1409, -86.6604) projected
  arc A113 (-111.1409, -88.6604) -> (-113.1409, -86.6604) centre (-113.1409, -88.6604) ccw projected
  line L93 (-111.1409, -89.9104) -> (-111.1409, -88.6604) projected
  arc A114 (-111.1409, -89.9104) -> (-109.1409, -91.9104) centre (-109.1409, -89.9104) ccw projected
  line L94 (-3.8909, -91.9104) -> (-109.1409, -91.9104) projected
  arc A115 (-1.8948, -93.7854) -> (-3.8909, -91.9104) centre (-3.8909, -93.9104) ccw projected
  arc A116 (-1.8948, -93.7854) -> (0.1013, -95.6604) centre (0.1013, -93.6604) ccw projected
  line L95 (45.1169, -95.6604) -> (0.1013, -95.6604) projected
  arc A117 (45.1169, -95.6604) -> (47.113, -93.7854) centre (45.1169, -93.6604) ccw projected
  arc A118 (49.1091, -91.9104) -> (47.113, -93.7854) centre (49.1091, -93.9104) ccw projected
  line L96 (55.1091, -91.9104) -> (49.1091, -91.9104) projected
  arc A119 (55.1091, -91.9104) -> (57.1091, -89.9104) centre (55.1091, -89.9104) ccw projected
  line L97 (57.1091, -57.6604) -> (57.1091, -89.9104) projected
  arc A120 (57.1091, -57.6604) -> (55.1091, -55.6604) centre (55.1091, -57.6604) ccw projected
  line L98 (0.1091, -55.6604) -> (55.1091, -55.6604) projected
  arc A121 (0.1091, -55.6604) -> (-1.887, -57.5354) centre (0.1091, -57.6604) ccw projected
  arc A122 (-3.8831, -59.4104) -> (-1.887, -57.5354) centre (-3.8831, -57.4104) ccw projected
  line L99 (-106.6409, -59.4104) -> (-3.8831, -59.4104) projected
  arc A123 (-106.6409, -59.4104) -> (-108.6409, -61.4104) centre (-106.6409, -61.4104) ccw projected
  line L100 (-108.6409, -62.6604) -> (-108.6409, -61.4104) projected
  arc A124 (-110.6409, -64.6604) -> (-108.6409, -62.6604) centre (-110.6409, -62.6604) ccw projected
  line L101 (-134.1409, -64.6604) -> (-110.6409, -64.6604) projected
  arc A125 (59.1091, -57.6604) -> (55.1091, -53.6604) centre (55.1091, -57.6604) ccw
  line L102 (59.1091, -57.6604) -> (59.1091, -89.9104)
  arc A126 (55.1091, -93.9104) -> (59.1091, -89.9104) centre (55.1091, -89.9104) ccw
  line L103 (55.1091, -93.9104) -> (49.1091, -93.9104)
  arc A127 (45.1169, -97.6604) -> (49.1091, -93.9104) centre (45.1169, -93.6604) ccw
  line L104 (45.1169, -97.6604) -> (0.1013, -97.6604)
  arc A128 (-3.8909, -93.9104) -> (0.1013, -97.6604) centre (0.1013, -93.6604) ccw
  line L105 (-3.8909, -93.9104) -> (-109.1409, -93.9104)
  arc A129 (-113.1409, -89.9104) -> (-109.1409, -93.9104) centre (-109.1409, -89.9104) ccw
  line L106 (-113.1409, -89.9104) -> (-113.1409, -88.6604)
  line L107 (-113.1409, -88.6604) -> (-134.1409, -88.6604)
  arc A130 (-138.1409, -84.6604) -> (-134.1409, -88.6604) centre (-134.1409, -84.6604) ccw
  line L108 (-138.1409, -84.6604) -> (-138.1409, -66.6604)
  arc A131 (-134.1409, -62.6604) -> (-138.1409, -66.6604) centre (-134.1409, -66.6604) ccw
  line L109 (-134.1409, -62.6604) -> (-110.6409, -62.6604)
  line L110 (-110.6409, -62.6604) -> (-110.6409, -61.4104)
  arc A132 (-106.6409, -57.4104) -> (-110.6409, -61.4104) centre (-106.6409, -61.4104) ccw
  line L111 (-106.6409, -57.4104) -> (-3.8831, -57.4104)
  arc A133 (0.1091, -53.6604) -> (-3.8831, -57.4104) centre (0.1091, -57.6604) ccw
  line L112 (0.1091, -53.6604) -> (55.1091, -53.6604)
  point P0 (0, 0)
  point P1 (-22.8909, -93.9104)
  point P2 (-22.8909, -181.9631)
  point P3 (0.7868, -53.6604)
  dimension "d0" = 2
  dimension "d1" = 2
  dimension "d2" = 2
extrude "Extrusion1" add sketch "Sketch1" along normal blind 0.5 contours L41 A71 L40 A70 A69 A68 L39 A67 L38 A66 L37 A65 A64 L90 A27 A26 A25 L10 A24 L9 A23 L8 A22 L7 A21 L6 A20 L5 A19 L4 A18 A17 L102 A125 A16 L3 A15 L2 A14 L1 A13 L0 L87 | L0 A13 L1 A14 L2 A15 L3 A16 A17 A125 A79 L51 A80 L52 A81 L53 L54 L87 | L54 L53 A81 L52 A80 L51 A79 A125 L112 L88 L87 | L105 A128 L104 A127 L103 A126 A79 L50 A78 L49 A77 L48 L47 L46 A76 L45 A75 L44 A74 A73 L43 L89 | A17 A18 L4 A19 L5 A20 L6 A21 L7 A22 L8 A23 L9 A24 L10 A25 A26 A27 L90 A73 A74 L44 A75 L45 A76 L46 L47 L48 A77 L49 A78 L50 A79 A126 L102
fillet "Fillet1" radius 1 6 edges at (-22.8909, -93.9104, 0.25) (-3.8909, -93.9104, 0.25) (49.1091, -93.9104, 0.25) (0.7868, -53.6604, 0.25) (30.052, -24.3952, 0.25) (-22.8909, -181.9631, 0.25)
properties part number "Cover Right"
